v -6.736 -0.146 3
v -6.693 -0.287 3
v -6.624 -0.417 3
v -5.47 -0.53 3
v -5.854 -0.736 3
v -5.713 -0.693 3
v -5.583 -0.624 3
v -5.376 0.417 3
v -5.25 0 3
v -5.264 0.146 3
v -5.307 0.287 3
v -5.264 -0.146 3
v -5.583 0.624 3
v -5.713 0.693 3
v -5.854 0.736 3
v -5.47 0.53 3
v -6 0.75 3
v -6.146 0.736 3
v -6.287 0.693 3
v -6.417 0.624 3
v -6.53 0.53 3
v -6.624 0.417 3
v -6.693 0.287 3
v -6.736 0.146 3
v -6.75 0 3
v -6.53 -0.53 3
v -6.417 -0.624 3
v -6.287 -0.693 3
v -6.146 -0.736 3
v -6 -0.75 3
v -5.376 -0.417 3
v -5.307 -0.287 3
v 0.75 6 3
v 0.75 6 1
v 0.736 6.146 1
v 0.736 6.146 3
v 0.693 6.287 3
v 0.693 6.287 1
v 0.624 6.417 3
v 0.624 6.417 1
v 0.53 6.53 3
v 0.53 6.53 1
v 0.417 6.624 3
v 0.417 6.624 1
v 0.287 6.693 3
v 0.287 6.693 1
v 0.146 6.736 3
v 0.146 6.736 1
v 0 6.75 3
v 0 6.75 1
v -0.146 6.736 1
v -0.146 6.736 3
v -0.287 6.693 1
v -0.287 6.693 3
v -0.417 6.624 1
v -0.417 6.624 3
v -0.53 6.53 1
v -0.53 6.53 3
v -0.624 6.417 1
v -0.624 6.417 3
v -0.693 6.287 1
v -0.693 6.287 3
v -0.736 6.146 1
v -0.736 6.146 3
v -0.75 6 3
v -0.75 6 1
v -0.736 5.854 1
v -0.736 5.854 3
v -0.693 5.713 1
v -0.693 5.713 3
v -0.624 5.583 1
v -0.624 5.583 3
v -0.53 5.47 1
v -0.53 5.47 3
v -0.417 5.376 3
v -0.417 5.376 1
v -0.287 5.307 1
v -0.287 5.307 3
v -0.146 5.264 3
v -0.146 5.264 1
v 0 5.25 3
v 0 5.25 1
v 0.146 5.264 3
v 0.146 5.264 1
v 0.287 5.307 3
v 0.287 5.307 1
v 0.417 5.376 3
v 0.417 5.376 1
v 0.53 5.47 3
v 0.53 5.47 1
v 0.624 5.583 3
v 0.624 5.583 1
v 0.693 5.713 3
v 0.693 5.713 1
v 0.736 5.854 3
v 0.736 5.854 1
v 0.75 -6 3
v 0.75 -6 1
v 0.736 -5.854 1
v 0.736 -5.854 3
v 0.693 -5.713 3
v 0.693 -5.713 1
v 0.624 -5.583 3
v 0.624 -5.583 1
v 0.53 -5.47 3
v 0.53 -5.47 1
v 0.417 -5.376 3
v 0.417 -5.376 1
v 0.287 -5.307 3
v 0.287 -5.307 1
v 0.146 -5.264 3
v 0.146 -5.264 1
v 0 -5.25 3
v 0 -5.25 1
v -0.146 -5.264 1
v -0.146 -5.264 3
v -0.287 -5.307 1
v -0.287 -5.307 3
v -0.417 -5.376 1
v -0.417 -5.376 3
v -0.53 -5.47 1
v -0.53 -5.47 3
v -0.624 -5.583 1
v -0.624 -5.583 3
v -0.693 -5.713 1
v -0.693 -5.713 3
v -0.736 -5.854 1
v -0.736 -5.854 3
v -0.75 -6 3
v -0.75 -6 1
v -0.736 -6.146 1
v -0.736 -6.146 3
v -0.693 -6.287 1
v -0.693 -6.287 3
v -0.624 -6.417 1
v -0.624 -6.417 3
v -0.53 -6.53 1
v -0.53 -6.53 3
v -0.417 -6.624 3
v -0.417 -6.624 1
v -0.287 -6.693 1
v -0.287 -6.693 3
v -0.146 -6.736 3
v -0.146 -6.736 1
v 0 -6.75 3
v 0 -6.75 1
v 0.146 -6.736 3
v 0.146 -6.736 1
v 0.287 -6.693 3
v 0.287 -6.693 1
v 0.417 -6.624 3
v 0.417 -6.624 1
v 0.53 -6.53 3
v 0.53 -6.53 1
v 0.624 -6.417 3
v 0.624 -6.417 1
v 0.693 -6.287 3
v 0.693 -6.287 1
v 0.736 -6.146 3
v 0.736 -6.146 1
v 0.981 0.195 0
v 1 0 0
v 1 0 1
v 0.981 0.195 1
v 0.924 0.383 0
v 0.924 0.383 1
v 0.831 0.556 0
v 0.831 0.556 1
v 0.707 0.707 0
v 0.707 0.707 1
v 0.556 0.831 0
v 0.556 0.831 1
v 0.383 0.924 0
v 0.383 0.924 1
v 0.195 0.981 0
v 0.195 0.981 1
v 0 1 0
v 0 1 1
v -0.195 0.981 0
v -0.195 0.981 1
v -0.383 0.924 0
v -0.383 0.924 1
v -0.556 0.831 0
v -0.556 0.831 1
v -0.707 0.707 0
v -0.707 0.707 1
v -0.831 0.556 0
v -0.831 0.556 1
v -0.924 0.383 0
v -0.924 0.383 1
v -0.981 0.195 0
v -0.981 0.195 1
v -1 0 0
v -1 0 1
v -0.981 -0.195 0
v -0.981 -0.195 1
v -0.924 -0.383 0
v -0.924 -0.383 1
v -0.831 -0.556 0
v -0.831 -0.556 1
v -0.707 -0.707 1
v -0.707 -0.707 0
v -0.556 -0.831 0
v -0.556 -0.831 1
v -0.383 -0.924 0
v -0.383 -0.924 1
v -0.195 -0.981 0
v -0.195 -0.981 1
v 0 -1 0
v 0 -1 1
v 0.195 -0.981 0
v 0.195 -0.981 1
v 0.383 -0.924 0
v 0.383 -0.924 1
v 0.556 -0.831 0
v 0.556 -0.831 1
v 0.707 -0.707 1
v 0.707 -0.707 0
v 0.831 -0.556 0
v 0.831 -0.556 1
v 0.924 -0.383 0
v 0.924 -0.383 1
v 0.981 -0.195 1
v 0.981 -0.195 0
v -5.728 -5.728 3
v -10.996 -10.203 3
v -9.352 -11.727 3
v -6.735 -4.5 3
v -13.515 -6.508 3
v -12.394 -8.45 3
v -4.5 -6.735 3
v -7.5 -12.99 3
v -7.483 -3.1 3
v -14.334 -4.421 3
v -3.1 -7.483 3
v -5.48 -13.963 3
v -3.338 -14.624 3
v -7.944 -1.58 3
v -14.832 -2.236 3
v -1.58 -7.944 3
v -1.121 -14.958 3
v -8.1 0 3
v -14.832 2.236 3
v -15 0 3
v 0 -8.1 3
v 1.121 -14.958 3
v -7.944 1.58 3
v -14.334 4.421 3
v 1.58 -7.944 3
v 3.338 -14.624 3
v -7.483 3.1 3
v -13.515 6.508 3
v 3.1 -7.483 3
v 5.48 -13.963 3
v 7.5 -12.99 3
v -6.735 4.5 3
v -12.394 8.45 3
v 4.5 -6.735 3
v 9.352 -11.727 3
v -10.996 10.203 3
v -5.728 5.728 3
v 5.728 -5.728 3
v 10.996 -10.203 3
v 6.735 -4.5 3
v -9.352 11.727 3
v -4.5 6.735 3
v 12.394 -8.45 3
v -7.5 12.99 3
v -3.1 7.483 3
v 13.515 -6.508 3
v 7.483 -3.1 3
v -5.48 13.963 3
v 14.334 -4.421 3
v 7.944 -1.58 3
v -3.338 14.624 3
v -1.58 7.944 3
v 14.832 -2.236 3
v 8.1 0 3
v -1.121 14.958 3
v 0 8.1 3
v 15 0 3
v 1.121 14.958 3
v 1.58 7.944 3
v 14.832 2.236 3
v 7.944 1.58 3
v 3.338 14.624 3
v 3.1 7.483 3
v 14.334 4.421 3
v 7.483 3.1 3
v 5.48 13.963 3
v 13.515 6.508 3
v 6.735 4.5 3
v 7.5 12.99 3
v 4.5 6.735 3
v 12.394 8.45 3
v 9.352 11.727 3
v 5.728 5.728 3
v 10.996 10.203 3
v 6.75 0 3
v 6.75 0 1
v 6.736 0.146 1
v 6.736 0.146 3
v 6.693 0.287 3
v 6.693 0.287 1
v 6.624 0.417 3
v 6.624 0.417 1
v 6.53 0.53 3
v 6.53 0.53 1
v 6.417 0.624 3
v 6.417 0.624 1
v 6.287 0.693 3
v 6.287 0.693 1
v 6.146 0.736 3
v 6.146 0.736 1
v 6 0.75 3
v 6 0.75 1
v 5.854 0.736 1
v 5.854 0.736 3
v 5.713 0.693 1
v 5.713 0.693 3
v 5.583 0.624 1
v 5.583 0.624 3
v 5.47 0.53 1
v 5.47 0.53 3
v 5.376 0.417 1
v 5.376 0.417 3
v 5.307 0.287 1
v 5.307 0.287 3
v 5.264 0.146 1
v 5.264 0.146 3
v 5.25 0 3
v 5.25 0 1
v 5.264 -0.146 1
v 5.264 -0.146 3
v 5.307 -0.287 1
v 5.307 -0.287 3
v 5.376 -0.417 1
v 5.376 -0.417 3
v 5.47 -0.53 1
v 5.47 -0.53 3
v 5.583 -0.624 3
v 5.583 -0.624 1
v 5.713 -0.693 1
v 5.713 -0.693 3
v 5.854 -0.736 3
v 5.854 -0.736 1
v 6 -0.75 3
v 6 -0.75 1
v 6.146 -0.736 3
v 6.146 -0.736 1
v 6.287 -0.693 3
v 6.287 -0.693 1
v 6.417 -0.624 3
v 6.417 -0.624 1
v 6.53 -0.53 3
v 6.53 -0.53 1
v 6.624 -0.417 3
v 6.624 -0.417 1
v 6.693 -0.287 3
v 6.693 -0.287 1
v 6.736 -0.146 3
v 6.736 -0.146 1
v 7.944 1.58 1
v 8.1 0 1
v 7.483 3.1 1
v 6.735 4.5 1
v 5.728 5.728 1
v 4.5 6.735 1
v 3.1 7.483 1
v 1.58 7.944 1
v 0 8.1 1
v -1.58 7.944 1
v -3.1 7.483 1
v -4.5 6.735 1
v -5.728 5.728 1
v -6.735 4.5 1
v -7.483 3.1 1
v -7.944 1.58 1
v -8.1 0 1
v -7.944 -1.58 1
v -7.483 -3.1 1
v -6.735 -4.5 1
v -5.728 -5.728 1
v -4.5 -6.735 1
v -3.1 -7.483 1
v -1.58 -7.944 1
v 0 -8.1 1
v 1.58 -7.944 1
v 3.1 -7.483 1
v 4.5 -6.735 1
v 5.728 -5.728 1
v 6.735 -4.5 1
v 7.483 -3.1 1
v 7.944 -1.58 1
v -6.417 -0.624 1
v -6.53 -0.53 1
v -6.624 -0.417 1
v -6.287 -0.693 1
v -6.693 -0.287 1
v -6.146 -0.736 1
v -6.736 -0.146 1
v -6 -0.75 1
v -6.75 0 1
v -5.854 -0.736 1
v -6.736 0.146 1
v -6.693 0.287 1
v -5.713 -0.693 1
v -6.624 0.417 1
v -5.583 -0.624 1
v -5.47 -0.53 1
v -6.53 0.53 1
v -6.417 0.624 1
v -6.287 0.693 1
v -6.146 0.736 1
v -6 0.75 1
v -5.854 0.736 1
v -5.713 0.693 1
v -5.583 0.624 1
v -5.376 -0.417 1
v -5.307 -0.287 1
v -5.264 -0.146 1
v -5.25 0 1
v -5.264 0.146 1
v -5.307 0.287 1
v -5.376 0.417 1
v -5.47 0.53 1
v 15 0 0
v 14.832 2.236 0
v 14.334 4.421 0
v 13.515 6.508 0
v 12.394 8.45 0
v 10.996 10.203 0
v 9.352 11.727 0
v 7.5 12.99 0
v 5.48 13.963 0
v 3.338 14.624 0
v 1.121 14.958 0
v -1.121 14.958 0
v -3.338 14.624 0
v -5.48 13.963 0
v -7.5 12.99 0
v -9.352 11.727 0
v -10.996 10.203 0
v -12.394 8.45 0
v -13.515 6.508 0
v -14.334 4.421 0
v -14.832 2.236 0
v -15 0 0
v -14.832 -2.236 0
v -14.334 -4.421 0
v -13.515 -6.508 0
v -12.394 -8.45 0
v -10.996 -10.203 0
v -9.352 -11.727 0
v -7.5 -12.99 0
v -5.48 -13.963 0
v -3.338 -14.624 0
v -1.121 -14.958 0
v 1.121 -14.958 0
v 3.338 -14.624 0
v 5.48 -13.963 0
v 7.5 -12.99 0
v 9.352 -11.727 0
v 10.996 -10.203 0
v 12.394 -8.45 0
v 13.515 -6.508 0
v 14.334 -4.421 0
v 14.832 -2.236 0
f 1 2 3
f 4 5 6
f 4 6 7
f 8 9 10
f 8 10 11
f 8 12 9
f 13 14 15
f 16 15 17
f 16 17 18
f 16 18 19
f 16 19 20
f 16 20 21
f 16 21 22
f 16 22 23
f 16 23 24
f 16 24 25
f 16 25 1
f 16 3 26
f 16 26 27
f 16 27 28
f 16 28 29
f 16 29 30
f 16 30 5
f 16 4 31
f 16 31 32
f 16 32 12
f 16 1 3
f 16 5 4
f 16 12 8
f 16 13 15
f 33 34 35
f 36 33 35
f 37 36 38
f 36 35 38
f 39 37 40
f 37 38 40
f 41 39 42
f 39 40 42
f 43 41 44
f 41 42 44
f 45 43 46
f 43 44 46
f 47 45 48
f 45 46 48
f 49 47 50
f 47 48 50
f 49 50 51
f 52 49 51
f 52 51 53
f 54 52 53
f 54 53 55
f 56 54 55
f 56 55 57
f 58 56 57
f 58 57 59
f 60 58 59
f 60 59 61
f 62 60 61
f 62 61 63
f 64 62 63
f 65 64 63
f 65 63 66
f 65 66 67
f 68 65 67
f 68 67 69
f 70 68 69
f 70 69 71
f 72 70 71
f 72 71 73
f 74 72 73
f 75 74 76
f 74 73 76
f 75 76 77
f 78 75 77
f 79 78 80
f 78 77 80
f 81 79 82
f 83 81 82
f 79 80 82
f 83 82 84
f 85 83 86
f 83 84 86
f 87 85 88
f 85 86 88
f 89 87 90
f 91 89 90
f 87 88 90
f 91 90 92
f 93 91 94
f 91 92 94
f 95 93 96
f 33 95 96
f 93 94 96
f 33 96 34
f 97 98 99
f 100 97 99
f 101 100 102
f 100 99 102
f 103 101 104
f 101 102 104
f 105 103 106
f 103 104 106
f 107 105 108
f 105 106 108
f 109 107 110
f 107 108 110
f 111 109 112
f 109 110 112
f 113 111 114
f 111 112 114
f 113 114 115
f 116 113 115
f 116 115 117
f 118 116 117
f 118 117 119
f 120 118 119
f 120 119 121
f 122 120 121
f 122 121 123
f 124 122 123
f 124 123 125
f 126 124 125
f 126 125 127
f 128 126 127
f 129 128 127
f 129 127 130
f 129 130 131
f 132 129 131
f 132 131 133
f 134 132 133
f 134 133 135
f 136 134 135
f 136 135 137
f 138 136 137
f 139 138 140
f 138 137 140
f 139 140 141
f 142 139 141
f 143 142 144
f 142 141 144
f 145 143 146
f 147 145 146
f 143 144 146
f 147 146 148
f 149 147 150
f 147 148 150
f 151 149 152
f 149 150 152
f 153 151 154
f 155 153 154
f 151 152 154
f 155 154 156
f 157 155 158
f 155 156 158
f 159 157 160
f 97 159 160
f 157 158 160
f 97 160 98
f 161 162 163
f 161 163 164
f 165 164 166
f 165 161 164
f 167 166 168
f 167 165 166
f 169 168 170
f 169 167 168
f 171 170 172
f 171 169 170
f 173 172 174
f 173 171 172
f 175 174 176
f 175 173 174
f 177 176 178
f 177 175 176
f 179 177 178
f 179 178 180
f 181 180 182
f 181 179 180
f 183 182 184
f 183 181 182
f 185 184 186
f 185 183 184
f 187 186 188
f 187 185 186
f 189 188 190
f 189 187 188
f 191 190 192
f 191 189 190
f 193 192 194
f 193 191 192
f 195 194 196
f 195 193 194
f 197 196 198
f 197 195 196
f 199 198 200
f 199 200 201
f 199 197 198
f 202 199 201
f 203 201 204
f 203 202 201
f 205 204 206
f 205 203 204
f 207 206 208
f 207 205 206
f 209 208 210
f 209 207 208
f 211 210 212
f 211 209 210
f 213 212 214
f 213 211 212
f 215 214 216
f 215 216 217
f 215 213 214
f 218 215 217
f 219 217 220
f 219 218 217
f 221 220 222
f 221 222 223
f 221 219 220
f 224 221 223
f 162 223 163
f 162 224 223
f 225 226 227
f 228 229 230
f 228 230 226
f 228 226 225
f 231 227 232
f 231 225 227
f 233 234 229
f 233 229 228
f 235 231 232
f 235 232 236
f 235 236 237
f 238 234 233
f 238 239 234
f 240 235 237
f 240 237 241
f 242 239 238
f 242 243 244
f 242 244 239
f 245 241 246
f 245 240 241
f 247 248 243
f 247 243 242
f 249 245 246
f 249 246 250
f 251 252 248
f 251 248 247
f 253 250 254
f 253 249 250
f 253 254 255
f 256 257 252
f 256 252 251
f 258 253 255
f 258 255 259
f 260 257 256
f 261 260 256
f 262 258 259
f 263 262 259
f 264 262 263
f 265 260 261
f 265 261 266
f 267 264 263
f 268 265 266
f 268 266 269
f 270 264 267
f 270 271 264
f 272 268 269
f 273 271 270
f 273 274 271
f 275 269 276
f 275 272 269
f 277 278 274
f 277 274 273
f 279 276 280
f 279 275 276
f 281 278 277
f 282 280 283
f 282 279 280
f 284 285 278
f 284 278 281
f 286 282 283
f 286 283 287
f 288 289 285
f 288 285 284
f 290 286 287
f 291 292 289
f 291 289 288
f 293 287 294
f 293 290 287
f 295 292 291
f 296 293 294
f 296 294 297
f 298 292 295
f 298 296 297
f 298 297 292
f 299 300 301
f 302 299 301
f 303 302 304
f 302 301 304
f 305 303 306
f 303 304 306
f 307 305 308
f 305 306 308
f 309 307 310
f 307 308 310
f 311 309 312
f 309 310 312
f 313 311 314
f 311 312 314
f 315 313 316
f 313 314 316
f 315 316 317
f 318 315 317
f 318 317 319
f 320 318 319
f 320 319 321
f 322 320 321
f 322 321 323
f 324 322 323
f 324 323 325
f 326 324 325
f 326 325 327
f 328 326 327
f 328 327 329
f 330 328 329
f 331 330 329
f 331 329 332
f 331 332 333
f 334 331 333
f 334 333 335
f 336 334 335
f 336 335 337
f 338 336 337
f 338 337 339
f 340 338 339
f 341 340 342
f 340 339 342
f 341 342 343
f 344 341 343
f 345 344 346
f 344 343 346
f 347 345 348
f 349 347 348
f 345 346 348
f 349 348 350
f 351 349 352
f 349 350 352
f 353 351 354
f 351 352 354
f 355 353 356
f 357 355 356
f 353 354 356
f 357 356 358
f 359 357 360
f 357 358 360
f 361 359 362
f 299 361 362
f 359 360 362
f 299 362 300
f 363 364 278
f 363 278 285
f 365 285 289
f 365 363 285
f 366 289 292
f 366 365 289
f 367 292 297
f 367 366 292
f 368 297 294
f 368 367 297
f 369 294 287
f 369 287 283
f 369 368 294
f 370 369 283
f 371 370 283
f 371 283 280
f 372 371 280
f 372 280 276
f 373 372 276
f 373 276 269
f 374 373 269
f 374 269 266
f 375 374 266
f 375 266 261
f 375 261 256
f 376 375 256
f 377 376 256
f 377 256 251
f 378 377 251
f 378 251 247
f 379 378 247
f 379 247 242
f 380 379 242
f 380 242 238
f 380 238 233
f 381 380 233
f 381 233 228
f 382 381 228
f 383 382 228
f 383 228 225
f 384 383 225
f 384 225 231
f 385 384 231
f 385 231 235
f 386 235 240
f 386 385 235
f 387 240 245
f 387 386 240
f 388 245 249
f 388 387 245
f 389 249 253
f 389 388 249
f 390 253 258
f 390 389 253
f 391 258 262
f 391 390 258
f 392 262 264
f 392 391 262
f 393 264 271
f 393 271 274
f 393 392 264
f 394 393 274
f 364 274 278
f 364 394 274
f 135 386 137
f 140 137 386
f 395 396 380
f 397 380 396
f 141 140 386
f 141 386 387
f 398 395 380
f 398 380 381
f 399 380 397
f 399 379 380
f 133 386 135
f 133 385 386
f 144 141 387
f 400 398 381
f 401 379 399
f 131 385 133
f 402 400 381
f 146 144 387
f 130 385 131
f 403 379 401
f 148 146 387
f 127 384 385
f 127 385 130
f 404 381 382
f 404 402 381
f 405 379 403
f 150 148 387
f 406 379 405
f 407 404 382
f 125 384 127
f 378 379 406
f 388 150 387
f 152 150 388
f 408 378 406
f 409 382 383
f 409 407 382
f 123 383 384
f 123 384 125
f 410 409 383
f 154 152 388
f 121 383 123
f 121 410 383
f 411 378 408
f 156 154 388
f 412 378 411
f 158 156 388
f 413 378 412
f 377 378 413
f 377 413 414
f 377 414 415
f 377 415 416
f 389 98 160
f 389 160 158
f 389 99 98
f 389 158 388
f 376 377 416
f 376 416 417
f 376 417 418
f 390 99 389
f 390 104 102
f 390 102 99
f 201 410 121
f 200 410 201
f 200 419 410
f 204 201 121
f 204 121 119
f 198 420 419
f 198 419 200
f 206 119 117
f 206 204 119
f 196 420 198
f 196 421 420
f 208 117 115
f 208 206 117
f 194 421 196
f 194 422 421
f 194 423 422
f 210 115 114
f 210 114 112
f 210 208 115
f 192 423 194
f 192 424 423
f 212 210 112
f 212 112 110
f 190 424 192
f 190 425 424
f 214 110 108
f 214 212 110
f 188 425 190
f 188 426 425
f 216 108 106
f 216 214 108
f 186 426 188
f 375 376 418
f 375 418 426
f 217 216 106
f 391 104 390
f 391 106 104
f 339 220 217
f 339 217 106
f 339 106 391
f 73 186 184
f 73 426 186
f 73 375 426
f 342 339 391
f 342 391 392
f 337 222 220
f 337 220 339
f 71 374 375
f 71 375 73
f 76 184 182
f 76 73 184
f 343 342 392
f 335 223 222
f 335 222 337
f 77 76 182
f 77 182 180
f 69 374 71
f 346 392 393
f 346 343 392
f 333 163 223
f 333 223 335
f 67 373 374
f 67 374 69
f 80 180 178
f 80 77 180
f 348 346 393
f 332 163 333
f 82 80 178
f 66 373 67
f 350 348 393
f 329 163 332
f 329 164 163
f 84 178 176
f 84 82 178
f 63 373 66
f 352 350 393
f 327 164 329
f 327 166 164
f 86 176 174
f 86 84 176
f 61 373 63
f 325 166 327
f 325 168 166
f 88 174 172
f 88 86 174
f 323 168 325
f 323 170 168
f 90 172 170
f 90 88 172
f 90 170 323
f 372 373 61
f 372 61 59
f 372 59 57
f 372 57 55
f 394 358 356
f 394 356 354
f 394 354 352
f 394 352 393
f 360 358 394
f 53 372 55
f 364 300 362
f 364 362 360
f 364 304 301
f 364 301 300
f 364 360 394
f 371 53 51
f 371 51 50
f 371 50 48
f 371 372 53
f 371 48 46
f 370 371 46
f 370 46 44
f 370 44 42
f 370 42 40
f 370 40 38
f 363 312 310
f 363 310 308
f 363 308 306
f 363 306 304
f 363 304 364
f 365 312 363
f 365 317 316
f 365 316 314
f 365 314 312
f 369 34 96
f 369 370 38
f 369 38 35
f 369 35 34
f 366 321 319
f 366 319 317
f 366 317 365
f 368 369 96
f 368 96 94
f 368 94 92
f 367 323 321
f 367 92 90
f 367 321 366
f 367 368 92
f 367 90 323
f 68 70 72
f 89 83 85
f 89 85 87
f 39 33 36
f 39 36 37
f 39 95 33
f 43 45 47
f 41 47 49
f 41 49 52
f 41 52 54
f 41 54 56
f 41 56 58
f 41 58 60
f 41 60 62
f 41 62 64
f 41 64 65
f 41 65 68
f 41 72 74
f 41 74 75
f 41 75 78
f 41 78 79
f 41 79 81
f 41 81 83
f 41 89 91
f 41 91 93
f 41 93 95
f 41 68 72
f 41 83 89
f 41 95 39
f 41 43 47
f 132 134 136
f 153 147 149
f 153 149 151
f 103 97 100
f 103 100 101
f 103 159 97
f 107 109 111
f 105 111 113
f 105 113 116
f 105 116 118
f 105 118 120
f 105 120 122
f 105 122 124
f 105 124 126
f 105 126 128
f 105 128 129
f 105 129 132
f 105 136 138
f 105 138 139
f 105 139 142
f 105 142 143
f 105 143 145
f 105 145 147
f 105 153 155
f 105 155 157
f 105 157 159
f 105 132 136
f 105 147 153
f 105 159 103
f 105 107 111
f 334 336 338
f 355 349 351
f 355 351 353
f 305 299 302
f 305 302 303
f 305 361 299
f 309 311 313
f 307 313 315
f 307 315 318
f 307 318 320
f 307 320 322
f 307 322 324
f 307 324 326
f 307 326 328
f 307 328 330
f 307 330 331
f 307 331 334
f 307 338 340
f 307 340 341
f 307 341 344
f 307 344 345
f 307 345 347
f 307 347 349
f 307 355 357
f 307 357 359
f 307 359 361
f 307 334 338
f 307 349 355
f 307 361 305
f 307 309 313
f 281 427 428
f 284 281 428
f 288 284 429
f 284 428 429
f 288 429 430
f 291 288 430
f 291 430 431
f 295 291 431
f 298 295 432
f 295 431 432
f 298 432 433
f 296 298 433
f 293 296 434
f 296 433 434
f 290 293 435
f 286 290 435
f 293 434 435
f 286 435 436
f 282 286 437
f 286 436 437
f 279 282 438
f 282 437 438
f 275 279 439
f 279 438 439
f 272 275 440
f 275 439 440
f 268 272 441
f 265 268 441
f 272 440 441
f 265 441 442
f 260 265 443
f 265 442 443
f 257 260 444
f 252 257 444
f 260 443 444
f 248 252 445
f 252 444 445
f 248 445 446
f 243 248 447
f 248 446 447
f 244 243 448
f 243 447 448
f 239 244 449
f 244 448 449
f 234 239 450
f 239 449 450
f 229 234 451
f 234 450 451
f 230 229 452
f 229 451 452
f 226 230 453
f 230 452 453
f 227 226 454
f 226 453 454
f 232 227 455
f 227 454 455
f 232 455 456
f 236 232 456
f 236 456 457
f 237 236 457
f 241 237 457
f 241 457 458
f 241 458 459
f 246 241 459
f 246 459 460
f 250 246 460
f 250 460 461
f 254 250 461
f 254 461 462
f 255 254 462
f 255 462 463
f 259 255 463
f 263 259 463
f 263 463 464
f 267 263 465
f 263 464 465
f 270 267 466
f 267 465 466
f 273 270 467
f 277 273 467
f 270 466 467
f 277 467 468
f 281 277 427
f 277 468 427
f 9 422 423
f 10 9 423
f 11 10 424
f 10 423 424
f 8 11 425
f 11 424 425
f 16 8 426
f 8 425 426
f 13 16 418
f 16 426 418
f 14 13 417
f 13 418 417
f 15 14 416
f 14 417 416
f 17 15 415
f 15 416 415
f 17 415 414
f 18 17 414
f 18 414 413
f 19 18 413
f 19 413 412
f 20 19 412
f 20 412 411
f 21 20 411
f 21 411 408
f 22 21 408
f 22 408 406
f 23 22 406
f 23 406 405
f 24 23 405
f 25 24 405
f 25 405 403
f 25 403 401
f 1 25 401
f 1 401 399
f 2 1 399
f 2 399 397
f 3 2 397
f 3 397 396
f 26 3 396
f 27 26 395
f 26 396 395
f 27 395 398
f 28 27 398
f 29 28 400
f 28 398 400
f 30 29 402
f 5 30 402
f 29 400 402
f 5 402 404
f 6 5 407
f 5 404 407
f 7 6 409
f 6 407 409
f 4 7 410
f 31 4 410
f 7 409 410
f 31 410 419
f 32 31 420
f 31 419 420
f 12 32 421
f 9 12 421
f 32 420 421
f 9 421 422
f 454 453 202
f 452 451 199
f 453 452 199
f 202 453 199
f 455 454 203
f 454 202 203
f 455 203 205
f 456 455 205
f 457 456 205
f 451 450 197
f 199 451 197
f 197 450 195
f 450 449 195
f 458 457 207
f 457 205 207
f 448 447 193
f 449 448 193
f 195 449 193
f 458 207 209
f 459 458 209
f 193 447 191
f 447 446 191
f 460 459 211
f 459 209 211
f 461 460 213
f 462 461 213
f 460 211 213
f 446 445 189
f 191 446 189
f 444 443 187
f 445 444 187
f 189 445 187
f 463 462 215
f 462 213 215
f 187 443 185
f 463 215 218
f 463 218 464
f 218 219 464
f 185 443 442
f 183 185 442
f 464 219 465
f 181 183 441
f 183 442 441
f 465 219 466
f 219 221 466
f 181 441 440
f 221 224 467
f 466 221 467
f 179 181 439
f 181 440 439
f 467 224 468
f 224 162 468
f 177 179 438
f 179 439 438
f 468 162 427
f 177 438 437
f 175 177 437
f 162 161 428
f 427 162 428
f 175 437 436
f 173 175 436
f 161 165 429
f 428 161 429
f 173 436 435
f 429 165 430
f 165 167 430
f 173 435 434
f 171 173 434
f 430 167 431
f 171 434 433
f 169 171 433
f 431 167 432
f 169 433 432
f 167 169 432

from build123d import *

# Parameters (mm, degrees)
SKETCH1_R           = 8.1
SKETCH1_R_2         = 1
BOSS_EXTRUDE1_DEPTH = 1
SKETCH1_3_R         = 15
SKETCH1_3_R_2       = 8.1
SKETCH1_3_R_3       = 0.75
BOSS_EXTRUDE2_DEPTH = 3


with BuildPart() as part:
    # Sketch1 → Boss-Extrude1 (new body)
    with BuildSketch(Plane.XY):
        Circle(SKETCH1_R)
        Circle(SKETCH1_R_2, mode=Mode.SUBTRACT)
    extrude(amount=BOSS_EXTRUDE1_DEPTH)

    # Sketch1<3> → Boss-Extrude2 (add)
    # profile 1 of 5: a face of its own
    with BuildSketch(Plane.XY):
        Circle(SKETCH1_3_R)
        Circle(SKETCH1_3_R_2, mode=Mode.SUBTRACT)
    # profile 2 of 5: a face of its own
    with BuildSketch(Plane.XY):
        with Locations((-6, 0)):
            Circle(SKETCH1_3_R_3)
    # profile 3 of 5: a face of its own
    with BuildSketch(Plane.XY):
        with Locations((0, -6)):
            Circle(SKETCH1_3_R_3)
    # profile 4 of 5: a face of its own
    with BuildSketch(Plane.XY):
        with Locations((6, 0)):
            Circle(SKETCH1_3_R_3)
    # profile 5 of 5: a face of its own
    with BuildSketch(Plane.XY):
        with Locations((0, 6)):
            Circle(SKETCH1_3_R_3)
    extrude(amount=BOSS_EXTRUDE2_DEPTH)


solid = part.part
